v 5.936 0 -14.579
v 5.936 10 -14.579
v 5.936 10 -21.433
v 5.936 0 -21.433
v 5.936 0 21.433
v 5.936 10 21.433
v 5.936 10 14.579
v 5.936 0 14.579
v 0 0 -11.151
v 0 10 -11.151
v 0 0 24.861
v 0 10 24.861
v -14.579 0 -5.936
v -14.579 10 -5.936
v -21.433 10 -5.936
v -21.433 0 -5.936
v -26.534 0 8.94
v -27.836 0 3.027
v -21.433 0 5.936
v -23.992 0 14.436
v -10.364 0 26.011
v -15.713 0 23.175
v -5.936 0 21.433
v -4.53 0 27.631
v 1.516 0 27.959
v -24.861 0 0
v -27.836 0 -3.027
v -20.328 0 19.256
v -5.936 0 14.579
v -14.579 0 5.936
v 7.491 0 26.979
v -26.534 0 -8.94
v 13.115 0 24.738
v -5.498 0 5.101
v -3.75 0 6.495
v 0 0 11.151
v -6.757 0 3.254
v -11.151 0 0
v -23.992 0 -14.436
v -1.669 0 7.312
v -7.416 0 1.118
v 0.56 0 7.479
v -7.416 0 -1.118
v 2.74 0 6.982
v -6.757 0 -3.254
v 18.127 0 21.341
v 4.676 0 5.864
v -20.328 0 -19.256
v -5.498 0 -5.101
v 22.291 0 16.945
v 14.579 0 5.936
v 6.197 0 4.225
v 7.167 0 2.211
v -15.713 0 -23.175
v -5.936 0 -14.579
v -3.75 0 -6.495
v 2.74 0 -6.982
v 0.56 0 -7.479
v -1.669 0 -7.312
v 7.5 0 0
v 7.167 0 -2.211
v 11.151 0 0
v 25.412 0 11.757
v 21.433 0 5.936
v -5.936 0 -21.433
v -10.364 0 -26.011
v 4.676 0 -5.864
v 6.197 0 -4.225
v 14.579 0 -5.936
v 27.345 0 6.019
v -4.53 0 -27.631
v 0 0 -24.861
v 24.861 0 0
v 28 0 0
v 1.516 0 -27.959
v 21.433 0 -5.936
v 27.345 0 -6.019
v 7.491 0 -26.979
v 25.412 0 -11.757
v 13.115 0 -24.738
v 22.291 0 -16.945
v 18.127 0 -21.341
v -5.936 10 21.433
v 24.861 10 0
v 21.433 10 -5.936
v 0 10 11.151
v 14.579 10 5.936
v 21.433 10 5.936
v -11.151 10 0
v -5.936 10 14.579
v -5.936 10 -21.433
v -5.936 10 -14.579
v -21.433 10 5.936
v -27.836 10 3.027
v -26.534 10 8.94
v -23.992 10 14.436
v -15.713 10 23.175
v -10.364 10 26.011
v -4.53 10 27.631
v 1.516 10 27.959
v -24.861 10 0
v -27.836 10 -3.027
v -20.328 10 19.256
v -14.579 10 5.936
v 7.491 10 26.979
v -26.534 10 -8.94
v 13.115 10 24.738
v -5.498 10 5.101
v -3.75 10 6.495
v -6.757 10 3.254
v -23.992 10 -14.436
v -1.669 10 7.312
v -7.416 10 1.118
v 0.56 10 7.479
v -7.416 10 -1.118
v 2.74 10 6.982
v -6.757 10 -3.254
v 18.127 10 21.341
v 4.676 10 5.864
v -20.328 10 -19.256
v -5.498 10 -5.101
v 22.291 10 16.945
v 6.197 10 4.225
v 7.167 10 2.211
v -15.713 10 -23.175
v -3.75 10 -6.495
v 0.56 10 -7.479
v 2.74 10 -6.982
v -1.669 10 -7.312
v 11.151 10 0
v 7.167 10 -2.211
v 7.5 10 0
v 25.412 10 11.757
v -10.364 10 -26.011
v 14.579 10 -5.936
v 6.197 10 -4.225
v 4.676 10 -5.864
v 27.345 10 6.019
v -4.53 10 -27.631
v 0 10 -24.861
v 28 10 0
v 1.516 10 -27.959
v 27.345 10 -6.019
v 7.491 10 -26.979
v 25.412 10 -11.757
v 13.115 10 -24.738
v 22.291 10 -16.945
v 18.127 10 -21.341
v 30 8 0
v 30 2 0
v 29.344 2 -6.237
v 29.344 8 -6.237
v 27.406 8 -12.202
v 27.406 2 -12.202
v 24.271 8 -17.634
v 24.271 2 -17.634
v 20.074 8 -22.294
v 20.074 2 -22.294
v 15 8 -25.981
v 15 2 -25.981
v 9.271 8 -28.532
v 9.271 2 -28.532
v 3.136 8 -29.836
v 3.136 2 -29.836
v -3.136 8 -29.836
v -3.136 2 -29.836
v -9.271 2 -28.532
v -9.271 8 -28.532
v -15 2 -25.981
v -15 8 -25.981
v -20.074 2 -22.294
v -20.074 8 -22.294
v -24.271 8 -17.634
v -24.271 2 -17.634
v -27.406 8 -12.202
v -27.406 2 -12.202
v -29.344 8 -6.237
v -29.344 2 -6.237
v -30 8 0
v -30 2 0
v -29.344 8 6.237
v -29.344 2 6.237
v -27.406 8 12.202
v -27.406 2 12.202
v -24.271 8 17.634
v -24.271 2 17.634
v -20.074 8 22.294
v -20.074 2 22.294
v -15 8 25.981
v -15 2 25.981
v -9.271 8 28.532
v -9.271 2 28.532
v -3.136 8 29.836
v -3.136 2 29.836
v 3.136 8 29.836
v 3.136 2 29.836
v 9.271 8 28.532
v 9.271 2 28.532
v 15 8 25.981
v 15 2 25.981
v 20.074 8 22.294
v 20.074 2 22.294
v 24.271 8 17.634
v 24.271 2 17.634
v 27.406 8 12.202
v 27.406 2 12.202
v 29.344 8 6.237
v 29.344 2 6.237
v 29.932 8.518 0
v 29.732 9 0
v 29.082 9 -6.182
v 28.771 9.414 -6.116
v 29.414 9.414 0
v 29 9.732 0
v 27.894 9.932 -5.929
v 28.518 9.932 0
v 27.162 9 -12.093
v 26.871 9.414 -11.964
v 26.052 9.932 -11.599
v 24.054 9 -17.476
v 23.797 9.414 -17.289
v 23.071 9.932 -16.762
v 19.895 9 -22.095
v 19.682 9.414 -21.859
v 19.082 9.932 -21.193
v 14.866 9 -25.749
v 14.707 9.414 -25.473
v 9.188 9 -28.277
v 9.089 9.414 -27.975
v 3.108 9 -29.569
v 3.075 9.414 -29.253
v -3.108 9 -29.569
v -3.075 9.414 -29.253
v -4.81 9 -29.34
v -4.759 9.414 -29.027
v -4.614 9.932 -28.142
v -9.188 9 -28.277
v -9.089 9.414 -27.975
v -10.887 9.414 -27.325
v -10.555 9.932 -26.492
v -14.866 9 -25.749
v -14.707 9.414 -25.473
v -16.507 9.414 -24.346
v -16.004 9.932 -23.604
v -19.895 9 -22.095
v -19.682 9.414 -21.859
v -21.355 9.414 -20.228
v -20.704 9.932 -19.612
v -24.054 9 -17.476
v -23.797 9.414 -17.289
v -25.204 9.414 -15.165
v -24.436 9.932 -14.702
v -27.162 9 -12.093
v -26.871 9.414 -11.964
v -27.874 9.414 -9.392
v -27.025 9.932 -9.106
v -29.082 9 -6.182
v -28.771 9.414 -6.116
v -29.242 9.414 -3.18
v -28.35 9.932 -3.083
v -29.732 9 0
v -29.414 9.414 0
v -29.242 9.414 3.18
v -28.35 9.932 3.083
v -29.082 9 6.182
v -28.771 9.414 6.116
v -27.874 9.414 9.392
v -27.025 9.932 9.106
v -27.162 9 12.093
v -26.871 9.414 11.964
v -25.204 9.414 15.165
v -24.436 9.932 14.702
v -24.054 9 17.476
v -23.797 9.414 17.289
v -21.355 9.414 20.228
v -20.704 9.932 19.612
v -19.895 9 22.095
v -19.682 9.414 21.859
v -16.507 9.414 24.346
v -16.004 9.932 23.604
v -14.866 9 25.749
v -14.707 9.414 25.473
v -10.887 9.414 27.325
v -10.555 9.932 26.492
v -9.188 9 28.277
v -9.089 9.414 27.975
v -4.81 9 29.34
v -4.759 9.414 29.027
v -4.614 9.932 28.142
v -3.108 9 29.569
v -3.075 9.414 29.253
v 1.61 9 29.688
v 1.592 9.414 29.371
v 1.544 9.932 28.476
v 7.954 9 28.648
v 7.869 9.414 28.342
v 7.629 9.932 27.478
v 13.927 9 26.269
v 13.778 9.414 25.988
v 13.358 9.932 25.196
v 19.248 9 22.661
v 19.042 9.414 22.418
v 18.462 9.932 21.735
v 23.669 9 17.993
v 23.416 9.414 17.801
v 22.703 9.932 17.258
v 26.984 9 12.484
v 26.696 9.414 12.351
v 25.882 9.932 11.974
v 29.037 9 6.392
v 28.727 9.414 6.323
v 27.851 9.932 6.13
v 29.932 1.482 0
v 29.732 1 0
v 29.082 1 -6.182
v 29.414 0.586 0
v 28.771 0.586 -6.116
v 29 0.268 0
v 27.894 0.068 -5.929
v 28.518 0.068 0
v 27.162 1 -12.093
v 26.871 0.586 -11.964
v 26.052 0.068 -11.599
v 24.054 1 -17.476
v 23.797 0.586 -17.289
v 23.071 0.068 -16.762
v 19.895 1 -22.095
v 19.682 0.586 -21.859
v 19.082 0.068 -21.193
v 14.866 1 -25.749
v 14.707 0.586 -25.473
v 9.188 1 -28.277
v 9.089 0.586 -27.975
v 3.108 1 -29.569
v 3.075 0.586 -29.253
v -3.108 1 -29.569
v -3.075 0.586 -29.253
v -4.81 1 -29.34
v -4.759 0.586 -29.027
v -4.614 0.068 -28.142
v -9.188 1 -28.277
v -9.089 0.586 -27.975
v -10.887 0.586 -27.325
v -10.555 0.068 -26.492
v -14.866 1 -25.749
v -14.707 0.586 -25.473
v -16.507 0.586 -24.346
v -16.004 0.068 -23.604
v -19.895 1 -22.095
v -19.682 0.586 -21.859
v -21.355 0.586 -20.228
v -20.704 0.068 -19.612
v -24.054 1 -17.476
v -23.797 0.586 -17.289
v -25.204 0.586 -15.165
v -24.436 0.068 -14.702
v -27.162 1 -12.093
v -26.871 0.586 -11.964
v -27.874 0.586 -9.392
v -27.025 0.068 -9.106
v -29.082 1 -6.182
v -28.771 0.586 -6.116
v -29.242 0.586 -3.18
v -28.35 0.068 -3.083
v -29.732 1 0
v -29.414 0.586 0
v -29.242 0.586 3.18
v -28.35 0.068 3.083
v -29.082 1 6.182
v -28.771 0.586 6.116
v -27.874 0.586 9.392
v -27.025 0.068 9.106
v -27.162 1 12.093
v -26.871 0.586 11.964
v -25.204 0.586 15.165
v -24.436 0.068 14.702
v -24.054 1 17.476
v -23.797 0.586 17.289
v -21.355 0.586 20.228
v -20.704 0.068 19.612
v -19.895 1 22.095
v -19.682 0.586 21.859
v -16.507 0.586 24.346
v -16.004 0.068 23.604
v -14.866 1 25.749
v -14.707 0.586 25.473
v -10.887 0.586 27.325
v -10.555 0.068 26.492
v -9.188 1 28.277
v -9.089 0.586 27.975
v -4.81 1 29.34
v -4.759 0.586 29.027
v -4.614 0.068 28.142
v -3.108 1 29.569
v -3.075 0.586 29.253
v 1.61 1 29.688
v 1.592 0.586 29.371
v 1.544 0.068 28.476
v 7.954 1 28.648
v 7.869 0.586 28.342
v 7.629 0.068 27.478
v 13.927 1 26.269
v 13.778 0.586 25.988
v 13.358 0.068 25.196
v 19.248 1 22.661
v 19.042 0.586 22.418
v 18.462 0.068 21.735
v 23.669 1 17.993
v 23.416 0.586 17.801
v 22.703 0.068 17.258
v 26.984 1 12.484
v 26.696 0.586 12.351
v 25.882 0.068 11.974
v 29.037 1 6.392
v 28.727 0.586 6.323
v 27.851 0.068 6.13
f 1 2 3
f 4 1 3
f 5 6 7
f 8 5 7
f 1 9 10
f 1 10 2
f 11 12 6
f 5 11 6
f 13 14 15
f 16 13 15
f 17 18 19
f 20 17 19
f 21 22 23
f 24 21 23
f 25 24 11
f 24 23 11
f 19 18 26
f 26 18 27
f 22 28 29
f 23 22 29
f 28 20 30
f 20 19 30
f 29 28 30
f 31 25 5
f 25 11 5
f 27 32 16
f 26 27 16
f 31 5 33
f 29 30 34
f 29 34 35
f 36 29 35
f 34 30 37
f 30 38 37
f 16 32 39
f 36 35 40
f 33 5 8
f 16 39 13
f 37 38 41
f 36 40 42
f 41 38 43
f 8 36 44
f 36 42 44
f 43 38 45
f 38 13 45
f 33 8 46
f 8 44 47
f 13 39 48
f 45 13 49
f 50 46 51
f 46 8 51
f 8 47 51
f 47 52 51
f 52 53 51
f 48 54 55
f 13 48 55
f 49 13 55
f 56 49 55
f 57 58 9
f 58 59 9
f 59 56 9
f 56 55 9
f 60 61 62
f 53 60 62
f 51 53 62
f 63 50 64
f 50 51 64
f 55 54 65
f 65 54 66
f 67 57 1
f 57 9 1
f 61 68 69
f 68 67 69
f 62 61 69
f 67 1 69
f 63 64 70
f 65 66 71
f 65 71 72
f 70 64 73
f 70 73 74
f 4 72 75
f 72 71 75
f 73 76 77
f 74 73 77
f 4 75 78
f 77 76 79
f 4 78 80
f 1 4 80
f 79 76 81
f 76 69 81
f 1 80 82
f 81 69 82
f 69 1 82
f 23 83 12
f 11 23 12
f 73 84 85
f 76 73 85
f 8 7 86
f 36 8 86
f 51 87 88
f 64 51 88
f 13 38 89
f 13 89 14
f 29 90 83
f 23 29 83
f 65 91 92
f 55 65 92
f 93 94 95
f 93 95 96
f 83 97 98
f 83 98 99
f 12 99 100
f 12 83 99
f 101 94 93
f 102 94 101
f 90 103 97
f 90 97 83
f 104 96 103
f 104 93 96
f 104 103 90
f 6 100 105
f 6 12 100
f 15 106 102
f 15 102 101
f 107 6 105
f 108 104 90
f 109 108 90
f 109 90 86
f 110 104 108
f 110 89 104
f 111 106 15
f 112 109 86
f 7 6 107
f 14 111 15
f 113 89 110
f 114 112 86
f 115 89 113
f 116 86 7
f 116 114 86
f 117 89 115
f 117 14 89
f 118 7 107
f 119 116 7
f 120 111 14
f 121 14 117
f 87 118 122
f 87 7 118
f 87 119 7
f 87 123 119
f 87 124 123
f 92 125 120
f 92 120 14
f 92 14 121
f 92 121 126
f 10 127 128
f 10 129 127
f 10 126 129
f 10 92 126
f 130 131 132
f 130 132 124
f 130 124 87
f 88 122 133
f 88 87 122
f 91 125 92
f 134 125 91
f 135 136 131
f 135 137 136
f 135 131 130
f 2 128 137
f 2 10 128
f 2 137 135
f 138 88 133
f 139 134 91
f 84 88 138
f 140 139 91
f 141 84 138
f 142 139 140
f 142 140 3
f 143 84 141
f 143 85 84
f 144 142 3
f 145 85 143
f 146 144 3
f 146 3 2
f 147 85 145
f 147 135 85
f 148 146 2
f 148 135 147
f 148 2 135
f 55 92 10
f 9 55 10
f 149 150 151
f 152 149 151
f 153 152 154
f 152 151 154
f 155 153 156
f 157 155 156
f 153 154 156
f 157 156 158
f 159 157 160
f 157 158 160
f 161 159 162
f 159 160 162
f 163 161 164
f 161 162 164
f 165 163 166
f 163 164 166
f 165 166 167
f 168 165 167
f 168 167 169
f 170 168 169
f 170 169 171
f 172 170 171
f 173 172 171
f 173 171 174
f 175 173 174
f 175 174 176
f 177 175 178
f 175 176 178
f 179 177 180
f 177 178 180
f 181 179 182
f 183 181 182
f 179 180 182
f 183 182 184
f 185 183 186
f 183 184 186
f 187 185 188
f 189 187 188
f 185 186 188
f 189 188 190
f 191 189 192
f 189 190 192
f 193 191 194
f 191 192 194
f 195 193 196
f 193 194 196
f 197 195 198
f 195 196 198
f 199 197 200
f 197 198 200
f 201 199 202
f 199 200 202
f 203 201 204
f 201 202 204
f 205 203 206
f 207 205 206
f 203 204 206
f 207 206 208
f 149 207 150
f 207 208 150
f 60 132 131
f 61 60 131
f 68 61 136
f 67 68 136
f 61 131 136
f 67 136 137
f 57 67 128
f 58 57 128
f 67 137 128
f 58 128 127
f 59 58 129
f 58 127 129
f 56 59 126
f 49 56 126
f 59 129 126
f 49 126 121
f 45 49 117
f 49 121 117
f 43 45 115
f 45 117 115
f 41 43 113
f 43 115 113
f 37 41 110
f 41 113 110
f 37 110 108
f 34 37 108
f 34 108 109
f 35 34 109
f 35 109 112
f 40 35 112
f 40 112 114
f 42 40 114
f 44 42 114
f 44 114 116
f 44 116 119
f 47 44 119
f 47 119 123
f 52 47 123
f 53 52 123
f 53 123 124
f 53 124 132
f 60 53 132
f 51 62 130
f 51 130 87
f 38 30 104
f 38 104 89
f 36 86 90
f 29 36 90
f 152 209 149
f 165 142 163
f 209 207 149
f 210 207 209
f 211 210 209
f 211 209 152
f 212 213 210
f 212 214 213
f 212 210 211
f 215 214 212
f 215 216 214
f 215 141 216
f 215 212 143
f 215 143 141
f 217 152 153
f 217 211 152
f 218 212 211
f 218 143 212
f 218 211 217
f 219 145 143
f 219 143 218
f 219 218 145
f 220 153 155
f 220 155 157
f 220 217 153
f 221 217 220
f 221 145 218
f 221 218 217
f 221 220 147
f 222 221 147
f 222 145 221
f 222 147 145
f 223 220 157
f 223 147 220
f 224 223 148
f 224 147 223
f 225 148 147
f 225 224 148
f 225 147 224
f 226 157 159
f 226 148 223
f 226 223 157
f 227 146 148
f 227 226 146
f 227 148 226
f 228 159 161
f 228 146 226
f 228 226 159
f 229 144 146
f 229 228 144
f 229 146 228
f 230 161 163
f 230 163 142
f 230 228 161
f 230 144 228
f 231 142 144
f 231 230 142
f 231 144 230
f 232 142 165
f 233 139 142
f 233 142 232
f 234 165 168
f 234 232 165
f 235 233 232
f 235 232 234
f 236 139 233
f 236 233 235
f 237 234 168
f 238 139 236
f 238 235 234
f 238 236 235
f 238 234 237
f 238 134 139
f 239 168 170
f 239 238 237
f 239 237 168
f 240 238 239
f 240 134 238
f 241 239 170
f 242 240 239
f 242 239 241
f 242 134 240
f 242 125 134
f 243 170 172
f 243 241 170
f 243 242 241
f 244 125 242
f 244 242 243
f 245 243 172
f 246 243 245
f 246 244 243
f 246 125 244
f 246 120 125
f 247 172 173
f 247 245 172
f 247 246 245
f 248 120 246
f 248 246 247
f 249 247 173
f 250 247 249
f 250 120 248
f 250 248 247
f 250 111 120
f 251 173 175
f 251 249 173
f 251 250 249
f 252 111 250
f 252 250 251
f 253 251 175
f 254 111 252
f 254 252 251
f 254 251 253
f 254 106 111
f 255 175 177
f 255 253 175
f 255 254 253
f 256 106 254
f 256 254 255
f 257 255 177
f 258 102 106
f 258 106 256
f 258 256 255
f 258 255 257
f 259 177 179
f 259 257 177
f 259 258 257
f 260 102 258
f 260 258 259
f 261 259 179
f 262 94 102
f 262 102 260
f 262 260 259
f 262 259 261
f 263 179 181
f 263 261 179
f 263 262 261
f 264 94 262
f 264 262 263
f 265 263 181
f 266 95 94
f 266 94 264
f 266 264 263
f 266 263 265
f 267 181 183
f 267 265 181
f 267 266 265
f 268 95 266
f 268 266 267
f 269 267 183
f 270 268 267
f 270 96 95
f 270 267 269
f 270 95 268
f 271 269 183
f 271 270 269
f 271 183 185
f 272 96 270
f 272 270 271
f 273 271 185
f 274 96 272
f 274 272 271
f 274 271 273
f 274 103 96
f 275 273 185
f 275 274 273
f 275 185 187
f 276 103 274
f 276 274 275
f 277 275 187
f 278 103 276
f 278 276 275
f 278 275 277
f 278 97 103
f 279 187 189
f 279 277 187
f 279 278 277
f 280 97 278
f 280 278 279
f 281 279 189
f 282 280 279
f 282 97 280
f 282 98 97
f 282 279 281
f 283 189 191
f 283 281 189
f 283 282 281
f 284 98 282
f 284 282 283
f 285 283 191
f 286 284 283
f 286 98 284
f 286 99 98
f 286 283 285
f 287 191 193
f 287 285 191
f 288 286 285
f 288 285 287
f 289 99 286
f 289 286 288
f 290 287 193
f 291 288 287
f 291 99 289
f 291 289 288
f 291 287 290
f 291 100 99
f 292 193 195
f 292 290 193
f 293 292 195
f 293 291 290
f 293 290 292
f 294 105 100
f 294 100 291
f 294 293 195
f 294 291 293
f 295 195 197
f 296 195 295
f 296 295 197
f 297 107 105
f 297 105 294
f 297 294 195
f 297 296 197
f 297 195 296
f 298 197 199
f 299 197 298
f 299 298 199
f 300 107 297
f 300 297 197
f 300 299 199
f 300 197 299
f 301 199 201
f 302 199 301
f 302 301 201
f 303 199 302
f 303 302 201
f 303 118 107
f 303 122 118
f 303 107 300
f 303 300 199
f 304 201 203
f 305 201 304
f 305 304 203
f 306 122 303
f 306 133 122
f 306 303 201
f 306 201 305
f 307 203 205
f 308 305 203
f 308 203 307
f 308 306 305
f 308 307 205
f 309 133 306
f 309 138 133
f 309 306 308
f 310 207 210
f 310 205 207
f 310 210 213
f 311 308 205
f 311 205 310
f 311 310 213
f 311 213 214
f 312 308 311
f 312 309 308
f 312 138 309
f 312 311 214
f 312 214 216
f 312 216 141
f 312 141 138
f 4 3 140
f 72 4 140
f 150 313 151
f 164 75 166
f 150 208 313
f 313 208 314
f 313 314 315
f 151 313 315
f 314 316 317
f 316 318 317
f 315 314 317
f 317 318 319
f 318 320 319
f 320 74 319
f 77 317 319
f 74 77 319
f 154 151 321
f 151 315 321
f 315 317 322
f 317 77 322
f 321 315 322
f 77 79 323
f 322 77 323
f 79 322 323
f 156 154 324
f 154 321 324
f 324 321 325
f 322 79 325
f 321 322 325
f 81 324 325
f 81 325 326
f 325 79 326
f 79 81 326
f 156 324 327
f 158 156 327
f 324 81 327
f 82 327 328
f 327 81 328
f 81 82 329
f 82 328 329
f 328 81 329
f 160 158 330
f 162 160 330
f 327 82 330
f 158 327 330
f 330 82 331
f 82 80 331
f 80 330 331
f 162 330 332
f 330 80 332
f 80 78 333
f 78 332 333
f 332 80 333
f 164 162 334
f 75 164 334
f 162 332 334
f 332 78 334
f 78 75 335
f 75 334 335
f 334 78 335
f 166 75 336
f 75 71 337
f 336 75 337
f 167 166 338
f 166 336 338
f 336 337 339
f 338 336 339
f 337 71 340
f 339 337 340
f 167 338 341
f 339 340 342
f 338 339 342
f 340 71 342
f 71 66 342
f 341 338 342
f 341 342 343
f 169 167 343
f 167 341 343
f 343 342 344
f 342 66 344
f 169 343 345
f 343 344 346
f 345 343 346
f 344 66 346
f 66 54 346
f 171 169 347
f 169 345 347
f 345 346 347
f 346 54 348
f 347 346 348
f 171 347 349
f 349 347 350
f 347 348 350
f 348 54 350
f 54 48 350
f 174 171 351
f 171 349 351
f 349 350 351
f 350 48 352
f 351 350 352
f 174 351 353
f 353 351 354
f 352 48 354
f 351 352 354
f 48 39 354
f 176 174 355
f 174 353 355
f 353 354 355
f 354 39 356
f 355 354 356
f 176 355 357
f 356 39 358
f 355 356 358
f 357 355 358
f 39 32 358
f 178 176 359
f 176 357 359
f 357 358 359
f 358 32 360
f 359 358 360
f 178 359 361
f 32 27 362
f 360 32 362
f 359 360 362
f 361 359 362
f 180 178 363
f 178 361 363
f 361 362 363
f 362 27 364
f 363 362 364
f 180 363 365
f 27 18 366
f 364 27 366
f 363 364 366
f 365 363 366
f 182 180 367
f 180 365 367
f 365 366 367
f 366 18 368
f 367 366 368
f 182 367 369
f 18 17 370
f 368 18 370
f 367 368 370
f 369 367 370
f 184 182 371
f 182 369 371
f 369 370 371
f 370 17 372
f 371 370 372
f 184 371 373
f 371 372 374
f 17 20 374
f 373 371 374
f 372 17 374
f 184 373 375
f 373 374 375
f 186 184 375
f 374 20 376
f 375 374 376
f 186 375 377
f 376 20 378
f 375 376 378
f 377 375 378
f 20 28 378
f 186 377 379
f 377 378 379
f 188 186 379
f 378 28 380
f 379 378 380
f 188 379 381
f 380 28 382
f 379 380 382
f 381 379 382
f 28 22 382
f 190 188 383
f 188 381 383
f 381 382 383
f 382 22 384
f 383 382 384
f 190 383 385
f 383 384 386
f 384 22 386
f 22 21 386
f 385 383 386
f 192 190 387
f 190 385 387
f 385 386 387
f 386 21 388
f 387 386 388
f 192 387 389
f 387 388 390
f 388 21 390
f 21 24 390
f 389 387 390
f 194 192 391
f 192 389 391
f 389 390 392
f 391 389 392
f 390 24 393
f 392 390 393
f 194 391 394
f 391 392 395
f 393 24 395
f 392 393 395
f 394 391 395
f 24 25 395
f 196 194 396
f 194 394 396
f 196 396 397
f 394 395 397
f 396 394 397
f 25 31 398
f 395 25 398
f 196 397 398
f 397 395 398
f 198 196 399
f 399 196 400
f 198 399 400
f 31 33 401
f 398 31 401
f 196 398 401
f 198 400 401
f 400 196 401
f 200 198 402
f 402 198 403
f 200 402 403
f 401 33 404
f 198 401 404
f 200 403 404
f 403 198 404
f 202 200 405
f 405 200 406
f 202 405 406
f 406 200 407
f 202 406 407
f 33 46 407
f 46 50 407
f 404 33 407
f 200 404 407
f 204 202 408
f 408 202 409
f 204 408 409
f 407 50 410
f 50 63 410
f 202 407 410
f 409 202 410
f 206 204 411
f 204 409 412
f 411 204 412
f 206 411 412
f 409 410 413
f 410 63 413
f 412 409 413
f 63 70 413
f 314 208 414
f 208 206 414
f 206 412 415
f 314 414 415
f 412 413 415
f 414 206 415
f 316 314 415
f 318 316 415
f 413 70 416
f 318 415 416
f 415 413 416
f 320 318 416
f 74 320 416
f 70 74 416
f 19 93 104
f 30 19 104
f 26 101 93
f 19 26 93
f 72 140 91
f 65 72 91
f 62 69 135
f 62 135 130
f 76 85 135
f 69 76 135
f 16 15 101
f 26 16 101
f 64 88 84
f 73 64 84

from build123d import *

# Parameters (mm, degrees)
SKETCH1_R           = 30
BOSS_EXTRUDE1_DEPTH = 10
SKETCH2_R           = 7.5
CUT_EXTRUDE1_DEPTH  = 11
FILLET1_R           = 2
CUT_EXTRUDE2_DEPTH  = 11
CIRPATTERN1_COUNT   = 4


with BuildPart() as part:
    # Sketch1 → Boss-Extrude1 (new body)
    with BuildSketch(Plane(origin=(0, 0, 0), x_dir=(1, 0, 0), z_dir=(0, 1, 0))):
        Circle(SKETCH1_R)
    extrude(amount=BOSS_EXTRUDE1_DEPTH)

    # Sketch2 → Cut-Extrude1 (cut, through all)
    with BuildSketch(Plane(origin=(0, 10, 0), x_dir=(1, 0, 0), z_dir=(0, 1, 0))):
        Circle(SKETCH2_R)
    extrude(amount=-CUT_EXTRUDE1_DEPTH, mode=Mode.SUBTRACT)

    # Fillet1
    fillet1_edges = [part.edges().sort_by_distance(p)[0] for p in [
        (-30, 0, 0),
        (-30, 10, 0),
    ]]
    fillet(fillet1_edges, radius=FILLET1_R)

    # Sketch3 → Cut-Extrude2 (cut, through all)
    with BuildSketch(Plane(origin=(0, 10, 0), x_dir=(1, 0, 0), z_dir=(0, 1, 0))):
        Polygon((0, 11.151208395), (5.936478896, 14.578636083), (5.936478896, 21.43349146), (0, 24.860919148), (-5.936478896, 21.43349146), (-5.936478896, 14.578636083), align=None)
    cut_extrude2 = extrude(amount=-CUT_EXTRUDE2_DEPTH, mode=Mode.SUBTRACT)

    # CirPattern1: Cut-Extrude2 ×4 about axis
    cirpattern1_axis = Axis((0, 0, 0), (0, 1, 0))
    for i in range(1, CIRPATTERN1_COUNT):
        add(cut_extrude2.rotate(cirpattern1_axis, i * 360 / CIRPATTERN1_COUNT), mode=Mode.SUBTRACT)


solid = part.part
